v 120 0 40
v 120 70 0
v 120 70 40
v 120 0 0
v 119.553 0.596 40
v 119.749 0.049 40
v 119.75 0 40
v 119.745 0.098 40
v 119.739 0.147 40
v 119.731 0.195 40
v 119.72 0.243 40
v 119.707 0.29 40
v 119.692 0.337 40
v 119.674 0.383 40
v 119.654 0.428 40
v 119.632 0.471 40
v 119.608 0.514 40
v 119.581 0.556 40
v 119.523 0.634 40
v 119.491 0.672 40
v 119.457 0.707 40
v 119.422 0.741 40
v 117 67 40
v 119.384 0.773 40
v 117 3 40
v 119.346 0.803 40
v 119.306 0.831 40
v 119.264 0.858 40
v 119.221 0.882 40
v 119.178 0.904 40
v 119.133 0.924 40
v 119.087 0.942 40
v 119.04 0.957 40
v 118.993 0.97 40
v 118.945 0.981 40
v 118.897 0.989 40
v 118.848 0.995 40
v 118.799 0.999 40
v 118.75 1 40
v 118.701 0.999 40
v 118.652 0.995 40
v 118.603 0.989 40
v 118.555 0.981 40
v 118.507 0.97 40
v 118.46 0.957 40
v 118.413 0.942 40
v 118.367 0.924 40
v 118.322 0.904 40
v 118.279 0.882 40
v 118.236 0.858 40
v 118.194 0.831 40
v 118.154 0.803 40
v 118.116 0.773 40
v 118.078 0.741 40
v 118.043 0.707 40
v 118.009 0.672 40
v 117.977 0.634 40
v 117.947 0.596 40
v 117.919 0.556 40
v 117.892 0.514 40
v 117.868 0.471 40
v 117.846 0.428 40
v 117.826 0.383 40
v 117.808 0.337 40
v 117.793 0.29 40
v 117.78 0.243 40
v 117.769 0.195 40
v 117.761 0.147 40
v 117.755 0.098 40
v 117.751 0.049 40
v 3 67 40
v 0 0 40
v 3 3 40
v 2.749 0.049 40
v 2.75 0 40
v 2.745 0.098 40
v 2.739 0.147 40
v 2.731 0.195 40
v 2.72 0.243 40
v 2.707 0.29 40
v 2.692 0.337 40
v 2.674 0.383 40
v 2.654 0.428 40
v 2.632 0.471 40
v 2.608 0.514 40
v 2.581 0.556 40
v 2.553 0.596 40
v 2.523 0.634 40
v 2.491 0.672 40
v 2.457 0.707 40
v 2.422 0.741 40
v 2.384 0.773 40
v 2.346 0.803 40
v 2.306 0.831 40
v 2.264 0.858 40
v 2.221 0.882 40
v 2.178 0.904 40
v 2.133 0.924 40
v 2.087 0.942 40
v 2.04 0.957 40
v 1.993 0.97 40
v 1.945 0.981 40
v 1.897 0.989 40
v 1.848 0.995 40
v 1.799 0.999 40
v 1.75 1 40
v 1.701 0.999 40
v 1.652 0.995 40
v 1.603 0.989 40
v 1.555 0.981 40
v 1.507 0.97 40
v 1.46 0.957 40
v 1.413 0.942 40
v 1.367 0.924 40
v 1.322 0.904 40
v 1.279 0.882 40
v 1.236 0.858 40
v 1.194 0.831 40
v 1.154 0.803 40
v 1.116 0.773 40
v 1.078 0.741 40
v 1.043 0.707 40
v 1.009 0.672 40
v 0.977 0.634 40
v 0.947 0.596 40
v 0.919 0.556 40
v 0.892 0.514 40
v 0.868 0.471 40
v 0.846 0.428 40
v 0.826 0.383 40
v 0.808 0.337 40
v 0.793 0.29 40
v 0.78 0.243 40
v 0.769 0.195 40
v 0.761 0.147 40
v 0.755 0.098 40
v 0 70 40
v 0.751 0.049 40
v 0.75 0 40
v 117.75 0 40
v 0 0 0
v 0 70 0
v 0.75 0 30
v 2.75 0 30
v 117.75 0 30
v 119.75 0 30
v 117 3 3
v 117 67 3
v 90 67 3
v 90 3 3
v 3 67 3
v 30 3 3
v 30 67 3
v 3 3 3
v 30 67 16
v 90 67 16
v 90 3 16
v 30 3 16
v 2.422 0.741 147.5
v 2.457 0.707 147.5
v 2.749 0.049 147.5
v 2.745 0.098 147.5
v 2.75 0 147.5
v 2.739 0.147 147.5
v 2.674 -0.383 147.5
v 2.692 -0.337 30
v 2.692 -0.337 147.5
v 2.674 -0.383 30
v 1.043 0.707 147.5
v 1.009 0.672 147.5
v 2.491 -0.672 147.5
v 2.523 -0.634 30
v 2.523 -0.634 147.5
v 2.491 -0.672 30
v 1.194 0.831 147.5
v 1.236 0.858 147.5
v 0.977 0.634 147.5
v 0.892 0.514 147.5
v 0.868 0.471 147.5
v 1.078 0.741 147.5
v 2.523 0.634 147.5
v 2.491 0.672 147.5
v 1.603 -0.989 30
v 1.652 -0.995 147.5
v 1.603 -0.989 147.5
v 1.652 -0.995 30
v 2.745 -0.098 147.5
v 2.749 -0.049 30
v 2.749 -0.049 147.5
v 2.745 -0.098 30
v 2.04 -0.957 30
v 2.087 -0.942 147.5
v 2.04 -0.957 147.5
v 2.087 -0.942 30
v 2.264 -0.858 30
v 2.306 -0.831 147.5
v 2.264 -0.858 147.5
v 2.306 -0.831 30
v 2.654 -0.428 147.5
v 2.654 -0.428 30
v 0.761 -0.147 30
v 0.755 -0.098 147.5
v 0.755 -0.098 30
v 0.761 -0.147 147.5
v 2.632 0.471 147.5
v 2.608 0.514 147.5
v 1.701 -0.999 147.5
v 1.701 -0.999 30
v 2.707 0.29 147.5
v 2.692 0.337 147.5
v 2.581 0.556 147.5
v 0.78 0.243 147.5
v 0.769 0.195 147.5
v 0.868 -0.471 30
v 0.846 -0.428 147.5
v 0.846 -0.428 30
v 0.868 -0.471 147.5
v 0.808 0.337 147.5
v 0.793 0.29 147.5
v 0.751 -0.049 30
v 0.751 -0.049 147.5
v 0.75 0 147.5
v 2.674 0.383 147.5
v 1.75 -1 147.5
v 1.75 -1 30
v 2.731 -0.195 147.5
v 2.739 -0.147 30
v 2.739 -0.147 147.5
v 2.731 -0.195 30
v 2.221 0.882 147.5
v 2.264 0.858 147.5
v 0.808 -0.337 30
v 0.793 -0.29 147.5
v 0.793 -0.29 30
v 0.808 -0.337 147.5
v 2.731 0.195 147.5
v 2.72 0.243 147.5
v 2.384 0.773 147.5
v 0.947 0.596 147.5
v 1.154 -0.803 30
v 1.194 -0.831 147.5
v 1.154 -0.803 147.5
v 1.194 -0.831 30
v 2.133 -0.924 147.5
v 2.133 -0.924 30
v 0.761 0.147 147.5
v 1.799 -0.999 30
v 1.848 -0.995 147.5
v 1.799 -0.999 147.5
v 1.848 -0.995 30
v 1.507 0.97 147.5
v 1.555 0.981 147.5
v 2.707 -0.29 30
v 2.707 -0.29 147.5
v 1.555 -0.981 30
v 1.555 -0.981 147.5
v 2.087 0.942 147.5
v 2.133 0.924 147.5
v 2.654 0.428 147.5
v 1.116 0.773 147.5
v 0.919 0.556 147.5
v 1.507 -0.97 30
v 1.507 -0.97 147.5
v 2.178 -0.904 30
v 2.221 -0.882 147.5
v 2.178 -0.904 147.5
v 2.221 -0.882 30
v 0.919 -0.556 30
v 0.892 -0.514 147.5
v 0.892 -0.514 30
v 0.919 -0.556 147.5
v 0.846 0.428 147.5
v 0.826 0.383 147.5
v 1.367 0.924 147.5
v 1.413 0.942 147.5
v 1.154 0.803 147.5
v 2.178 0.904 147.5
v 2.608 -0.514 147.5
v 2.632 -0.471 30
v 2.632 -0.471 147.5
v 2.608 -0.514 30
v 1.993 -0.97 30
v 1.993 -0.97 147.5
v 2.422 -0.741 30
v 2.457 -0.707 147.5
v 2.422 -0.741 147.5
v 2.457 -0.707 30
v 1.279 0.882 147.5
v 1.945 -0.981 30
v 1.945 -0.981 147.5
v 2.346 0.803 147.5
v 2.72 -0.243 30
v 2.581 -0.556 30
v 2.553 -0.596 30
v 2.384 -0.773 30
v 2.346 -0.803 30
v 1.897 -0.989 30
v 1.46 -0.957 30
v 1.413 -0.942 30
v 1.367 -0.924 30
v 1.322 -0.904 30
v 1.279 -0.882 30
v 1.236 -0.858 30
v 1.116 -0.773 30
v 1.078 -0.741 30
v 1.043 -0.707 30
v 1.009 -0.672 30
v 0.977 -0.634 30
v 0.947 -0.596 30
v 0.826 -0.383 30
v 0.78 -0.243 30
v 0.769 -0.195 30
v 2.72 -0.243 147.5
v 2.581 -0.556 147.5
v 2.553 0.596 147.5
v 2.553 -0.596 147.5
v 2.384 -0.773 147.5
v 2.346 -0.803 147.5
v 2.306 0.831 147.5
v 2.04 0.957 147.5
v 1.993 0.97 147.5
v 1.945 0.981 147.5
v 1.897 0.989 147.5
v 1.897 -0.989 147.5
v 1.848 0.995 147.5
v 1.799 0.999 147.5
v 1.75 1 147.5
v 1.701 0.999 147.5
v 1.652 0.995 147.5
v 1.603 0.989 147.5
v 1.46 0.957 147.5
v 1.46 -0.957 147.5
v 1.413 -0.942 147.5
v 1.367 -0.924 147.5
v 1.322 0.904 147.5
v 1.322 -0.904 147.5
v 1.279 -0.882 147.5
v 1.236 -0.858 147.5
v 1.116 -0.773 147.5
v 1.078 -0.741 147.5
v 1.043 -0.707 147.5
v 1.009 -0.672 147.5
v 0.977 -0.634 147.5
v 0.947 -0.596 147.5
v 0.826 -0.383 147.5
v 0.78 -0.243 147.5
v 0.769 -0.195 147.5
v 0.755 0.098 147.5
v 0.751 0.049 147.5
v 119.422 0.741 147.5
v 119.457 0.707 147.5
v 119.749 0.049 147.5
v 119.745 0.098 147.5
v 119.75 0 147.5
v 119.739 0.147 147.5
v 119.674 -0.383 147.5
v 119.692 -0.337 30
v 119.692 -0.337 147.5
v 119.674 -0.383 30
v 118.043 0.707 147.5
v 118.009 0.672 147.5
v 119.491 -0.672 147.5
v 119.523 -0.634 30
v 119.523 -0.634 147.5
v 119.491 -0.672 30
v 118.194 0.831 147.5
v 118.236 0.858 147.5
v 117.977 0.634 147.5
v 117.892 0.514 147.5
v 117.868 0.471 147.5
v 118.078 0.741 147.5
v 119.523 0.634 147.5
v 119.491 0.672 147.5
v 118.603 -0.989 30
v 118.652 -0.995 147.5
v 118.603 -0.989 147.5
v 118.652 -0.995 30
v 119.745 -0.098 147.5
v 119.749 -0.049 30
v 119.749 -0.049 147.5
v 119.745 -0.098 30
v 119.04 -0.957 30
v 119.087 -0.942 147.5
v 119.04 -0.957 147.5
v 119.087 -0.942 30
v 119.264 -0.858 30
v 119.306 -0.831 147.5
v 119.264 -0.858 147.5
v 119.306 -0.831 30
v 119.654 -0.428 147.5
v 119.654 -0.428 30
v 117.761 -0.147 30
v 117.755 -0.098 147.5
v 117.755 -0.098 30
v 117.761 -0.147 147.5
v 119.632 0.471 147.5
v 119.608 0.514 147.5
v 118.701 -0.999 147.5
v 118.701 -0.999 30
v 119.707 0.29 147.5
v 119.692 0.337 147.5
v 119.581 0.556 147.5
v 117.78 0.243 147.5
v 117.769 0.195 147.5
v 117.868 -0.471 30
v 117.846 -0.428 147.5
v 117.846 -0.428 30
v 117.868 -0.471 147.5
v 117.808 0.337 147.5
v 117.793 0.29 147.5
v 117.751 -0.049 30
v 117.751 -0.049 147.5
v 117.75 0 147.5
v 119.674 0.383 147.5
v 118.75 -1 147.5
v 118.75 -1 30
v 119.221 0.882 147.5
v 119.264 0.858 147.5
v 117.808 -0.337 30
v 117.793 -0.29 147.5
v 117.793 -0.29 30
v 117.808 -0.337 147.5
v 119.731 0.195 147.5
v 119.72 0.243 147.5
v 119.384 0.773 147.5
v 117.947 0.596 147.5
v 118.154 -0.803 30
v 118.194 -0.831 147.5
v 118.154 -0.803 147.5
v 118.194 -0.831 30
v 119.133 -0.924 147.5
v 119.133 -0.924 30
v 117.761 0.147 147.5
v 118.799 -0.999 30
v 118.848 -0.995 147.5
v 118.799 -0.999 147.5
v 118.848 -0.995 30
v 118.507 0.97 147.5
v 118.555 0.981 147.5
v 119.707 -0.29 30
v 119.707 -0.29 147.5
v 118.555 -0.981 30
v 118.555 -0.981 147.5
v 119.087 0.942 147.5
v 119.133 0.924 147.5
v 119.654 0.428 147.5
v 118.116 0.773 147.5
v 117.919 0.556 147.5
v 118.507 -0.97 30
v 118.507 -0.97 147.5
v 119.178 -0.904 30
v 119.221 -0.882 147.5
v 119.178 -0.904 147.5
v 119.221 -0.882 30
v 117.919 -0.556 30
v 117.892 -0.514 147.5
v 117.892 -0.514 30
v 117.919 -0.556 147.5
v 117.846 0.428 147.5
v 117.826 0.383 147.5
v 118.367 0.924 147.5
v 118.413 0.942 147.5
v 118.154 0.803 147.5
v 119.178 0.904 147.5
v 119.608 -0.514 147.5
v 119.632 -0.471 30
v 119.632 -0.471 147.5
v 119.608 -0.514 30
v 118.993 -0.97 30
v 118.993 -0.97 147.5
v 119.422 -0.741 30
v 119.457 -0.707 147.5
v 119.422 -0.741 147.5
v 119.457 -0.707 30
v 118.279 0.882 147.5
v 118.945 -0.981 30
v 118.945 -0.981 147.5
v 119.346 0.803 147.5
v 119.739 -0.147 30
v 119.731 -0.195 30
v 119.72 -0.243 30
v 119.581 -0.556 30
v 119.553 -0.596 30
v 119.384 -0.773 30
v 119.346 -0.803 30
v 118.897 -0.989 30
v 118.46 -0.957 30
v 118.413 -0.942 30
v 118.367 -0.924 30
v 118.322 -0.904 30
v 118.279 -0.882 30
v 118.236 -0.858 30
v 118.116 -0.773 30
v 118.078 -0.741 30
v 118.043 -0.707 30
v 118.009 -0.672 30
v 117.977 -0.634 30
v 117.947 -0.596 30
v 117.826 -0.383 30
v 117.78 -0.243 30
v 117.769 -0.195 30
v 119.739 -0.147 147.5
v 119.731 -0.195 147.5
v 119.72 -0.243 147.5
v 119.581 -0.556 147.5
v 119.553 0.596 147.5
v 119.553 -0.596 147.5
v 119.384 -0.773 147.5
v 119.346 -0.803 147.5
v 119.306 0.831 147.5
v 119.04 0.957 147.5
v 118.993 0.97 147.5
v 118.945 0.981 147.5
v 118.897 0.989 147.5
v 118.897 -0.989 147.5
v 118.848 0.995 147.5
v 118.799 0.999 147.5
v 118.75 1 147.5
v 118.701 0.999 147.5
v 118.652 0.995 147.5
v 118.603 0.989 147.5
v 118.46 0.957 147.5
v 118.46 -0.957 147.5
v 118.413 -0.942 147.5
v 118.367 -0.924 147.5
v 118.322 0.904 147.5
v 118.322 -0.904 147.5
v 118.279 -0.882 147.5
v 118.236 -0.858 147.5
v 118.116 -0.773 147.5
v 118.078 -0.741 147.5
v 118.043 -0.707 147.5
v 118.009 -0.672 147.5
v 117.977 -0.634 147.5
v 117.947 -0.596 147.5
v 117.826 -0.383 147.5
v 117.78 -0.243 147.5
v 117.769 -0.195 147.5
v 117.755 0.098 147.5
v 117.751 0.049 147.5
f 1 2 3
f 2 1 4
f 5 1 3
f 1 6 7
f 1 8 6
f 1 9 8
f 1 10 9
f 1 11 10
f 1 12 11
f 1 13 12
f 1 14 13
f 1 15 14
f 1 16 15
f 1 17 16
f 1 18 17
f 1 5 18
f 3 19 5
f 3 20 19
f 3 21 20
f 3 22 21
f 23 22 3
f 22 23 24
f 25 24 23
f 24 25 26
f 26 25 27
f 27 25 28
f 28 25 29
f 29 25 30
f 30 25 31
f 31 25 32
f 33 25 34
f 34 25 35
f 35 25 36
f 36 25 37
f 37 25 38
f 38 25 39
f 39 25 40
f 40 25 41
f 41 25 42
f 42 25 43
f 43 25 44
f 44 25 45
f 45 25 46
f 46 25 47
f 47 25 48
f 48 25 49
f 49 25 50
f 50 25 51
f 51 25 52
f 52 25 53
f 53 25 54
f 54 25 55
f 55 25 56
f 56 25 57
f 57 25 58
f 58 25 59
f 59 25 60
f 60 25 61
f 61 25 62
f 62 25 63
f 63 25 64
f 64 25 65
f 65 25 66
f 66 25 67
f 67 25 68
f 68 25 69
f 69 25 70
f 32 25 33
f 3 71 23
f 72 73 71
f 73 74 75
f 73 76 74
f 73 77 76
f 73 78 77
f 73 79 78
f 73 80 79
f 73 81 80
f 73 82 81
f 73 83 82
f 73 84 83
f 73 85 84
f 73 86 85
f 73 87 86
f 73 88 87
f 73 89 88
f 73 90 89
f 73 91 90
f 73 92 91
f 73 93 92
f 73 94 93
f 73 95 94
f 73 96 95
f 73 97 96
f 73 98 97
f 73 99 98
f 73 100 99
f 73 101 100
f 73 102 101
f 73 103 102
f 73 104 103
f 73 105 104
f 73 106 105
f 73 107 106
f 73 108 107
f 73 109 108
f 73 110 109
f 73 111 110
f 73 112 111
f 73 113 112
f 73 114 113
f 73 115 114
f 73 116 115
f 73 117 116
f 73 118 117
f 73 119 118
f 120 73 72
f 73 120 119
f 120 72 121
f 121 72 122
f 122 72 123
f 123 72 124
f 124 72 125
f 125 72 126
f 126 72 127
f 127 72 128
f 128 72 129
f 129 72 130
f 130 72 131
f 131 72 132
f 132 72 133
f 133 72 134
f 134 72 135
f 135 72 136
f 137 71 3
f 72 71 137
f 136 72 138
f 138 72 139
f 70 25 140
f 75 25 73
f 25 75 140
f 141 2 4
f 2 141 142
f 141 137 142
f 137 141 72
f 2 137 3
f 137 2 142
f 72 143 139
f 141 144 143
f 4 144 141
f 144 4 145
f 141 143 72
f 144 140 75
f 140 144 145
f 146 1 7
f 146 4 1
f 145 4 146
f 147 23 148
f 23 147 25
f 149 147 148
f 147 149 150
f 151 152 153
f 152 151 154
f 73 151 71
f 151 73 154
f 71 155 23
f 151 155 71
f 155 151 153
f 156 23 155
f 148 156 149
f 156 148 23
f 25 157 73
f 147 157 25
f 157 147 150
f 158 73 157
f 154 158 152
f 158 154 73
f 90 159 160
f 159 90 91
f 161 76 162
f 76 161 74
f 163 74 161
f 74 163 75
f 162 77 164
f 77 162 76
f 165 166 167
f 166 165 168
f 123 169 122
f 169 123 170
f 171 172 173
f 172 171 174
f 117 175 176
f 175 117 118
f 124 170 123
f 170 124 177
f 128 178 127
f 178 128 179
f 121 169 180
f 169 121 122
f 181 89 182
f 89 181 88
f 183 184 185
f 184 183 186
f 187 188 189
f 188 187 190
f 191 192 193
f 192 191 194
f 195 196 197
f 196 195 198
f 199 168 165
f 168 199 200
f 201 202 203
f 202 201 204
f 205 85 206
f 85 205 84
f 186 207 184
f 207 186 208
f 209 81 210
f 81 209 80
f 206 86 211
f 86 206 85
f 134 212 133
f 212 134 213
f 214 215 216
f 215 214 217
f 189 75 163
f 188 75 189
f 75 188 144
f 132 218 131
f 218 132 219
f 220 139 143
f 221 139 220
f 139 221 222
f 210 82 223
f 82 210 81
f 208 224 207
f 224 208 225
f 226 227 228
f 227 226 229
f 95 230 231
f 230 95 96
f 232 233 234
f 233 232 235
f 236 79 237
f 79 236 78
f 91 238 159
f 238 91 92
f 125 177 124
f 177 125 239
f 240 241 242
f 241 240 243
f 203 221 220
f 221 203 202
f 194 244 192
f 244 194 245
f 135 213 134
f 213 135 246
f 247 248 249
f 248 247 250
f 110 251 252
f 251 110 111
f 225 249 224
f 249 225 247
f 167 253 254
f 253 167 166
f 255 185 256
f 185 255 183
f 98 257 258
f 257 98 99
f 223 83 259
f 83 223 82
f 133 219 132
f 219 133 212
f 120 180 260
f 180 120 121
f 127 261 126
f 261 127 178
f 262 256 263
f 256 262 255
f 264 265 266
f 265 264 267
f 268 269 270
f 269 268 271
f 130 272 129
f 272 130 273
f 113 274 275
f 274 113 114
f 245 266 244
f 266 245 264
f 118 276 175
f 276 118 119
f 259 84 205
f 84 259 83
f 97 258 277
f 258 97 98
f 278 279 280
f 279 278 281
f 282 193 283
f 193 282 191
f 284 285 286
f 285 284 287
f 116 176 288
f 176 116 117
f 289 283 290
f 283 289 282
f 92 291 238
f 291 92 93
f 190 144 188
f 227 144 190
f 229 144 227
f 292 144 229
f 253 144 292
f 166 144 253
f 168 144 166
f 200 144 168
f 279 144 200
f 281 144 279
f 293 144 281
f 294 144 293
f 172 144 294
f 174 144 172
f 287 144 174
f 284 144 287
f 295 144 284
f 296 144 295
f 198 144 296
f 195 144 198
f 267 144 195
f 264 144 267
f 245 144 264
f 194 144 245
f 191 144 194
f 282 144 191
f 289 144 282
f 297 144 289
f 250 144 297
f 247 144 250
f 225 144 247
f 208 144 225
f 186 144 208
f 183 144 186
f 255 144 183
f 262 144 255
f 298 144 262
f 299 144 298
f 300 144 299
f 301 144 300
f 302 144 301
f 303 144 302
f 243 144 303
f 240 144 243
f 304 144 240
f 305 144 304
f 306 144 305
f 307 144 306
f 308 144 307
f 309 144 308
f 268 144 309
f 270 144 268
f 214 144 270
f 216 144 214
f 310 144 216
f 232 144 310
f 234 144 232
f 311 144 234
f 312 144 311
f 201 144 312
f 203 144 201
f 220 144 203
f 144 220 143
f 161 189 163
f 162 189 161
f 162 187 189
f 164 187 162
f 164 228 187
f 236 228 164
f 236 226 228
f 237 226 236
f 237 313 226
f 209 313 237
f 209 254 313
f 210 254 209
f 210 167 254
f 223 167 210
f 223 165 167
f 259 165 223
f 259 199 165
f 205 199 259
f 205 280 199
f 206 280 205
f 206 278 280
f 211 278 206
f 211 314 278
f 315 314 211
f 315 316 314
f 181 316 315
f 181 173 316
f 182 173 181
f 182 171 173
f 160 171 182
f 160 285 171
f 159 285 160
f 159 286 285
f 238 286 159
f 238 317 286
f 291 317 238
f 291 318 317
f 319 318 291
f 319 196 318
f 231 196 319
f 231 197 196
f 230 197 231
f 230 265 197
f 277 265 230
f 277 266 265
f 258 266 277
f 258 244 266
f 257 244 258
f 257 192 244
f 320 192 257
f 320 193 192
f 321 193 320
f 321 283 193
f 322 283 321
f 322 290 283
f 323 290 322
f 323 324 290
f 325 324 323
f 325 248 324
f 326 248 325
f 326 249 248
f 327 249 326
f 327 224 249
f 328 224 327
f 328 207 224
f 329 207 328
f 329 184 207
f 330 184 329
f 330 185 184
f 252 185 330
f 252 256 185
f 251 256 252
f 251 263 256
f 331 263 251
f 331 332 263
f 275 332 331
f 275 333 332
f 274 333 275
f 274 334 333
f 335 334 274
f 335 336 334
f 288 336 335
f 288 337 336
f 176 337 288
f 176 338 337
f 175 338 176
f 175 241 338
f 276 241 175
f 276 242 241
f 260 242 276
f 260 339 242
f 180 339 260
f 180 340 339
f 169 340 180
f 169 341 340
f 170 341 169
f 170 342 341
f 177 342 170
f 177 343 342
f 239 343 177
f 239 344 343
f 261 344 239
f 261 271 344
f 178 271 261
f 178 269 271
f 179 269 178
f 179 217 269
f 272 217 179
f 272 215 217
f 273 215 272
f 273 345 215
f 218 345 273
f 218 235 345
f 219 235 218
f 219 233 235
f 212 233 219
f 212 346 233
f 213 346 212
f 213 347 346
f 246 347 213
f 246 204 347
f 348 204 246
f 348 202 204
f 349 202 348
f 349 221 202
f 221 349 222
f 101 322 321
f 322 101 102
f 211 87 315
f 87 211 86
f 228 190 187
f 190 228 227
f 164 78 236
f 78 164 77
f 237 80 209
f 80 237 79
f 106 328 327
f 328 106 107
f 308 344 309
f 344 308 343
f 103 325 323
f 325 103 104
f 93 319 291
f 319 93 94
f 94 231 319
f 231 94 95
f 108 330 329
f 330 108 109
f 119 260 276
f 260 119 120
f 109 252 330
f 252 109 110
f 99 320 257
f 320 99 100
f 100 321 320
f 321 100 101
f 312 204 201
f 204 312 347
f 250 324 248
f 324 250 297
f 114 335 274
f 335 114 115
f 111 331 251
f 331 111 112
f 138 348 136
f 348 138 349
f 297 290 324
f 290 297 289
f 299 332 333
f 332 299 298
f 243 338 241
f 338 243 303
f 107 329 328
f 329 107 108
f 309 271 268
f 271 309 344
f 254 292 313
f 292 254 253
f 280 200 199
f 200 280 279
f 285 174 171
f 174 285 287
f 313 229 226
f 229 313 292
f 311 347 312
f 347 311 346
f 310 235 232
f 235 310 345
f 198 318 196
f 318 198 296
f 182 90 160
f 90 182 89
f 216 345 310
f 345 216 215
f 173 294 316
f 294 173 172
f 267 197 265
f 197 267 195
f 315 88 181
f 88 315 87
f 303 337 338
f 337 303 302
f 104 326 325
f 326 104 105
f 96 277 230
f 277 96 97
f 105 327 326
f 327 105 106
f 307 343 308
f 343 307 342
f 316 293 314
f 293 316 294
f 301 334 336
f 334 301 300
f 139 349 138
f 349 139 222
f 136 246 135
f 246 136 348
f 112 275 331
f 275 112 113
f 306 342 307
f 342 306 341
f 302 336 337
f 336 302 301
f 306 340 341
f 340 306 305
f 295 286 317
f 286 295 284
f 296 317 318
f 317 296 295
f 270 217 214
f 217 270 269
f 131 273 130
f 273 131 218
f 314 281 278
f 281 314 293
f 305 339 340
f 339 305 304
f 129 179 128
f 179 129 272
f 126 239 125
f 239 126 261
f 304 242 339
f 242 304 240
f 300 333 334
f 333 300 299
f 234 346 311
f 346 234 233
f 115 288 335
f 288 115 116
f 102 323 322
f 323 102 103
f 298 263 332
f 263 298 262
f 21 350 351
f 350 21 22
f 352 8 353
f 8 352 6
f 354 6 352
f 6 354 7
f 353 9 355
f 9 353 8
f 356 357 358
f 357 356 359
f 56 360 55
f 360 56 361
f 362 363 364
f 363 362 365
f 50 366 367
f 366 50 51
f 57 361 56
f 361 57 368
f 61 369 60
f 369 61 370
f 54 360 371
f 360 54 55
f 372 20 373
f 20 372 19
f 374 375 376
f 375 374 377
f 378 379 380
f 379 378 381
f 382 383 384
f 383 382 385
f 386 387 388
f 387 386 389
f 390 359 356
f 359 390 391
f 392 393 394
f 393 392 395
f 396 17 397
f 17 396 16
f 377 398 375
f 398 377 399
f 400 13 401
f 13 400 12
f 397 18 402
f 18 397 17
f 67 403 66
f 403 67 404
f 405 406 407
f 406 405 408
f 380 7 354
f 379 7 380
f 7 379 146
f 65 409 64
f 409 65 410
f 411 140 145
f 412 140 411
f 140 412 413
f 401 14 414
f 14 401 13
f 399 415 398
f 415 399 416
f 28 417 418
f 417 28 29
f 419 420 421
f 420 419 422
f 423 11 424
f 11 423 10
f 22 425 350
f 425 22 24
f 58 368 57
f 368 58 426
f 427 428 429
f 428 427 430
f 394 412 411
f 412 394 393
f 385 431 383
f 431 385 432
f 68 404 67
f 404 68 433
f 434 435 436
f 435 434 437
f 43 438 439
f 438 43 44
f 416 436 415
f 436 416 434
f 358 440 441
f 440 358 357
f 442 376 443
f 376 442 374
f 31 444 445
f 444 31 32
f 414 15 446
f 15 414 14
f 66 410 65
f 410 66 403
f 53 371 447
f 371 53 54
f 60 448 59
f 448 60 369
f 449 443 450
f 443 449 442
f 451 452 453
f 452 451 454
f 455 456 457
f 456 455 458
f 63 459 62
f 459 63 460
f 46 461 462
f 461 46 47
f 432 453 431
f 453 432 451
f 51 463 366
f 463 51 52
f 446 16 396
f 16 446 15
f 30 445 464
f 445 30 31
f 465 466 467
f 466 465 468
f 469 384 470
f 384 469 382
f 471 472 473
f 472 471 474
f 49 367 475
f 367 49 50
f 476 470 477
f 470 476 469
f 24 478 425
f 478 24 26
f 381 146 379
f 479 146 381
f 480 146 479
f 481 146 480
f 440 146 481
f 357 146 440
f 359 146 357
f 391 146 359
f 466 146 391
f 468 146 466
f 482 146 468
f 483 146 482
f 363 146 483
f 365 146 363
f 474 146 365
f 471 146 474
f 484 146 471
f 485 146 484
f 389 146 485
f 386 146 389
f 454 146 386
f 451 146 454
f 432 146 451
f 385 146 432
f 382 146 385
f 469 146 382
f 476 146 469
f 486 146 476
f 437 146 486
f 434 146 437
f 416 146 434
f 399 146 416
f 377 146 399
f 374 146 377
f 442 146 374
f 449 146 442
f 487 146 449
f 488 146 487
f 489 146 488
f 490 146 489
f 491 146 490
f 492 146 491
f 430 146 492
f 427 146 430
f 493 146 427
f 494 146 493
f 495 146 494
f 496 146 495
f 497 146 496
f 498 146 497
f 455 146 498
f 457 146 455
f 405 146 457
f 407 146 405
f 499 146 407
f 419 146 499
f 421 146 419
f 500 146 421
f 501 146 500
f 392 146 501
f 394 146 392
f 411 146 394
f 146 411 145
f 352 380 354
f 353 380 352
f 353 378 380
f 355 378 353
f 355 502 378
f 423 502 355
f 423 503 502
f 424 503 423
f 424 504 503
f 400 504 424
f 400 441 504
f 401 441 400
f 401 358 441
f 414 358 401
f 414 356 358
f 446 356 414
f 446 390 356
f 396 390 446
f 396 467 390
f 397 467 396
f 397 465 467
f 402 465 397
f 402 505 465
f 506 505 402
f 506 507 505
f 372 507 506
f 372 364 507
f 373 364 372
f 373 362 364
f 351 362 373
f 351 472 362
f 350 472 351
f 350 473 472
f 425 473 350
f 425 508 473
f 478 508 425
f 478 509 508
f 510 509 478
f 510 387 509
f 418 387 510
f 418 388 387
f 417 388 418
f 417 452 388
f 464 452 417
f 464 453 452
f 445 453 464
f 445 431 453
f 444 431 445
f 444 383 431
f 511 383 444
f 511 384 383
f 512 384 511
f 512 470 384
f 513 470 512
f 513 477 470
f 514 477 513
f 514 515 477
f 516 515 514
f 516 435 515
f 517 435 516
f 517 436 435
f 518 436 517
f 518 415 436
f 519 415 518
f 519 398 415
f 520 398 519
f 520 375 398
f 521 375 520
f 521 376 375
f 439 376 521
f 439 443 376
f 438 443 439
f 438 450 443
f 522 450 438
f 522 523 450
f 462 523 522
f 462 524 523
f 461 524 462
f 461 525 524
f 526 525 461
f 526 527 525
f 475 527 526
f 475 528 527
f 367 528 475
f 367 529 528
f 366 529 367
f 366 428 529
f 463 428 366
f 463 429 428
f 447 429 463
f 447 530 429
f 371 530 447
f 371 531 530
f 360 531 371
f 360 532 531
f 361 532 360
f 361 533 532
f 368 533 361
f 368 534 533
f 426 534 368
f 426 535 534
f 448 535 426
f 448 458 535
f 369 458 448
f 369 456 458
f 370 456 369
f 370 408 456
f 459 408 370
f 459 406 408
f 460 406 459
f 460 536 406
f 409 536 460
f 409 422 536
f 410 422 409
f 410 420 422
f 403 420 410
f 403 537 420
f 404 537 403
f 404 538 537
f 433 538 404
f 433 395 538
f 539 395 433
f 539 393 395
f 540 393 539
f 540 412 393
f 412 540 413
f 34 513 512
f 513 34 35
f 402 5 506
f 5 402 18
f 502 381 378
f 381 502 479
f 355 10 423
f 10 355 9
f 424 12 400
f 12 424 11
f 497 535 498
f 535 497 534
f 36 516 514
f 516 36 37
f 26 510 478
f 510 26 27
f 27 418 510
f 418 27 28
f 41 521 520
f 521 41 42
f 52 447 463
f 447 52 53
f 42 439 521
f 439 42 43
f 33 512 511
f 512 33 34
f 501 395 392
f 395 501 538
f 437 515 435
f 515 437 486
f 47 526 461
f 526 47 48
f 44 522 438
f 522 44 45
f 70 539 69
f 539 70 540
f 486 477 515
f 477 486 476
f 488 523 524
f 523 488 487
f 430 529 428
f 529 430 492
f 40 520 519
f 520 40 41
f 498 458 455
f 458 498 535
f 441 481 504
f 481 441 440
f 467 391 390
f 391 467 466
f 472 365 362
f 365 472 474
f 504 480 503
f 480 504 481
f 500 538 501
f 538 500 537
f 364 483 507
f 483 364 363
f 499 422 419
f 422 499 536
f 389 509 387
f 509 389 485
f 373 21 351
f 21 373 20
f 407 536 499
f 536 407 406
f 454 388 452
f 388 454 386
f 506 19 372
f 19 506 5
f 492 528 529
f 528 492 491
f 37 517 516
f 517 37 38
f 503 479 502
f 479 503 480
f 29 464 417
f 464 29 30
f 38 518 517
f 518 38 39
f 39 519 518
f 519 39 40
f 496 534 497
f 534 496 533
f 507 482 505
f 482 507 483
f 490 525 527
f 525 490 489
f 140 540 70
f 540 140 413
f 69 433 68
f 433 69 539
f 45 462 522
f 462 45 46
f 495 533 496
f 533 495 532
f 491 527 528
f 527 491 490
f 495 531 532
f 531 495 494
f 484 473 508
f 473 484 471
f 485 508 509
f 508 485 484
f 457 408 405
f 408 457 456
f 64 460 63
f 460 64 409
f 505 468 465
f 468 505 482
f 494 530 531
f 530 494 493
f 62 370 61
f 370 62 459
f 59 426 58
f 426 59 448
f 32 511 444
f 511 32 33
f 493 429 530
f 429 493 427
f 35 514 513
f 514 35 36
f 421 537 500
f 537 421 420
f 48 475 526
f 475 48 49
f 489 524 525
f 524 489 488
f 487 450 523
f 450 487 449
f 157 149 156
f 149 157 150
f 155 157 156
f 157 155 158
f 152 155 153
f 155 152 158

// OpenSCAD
// Buffer Tank for Mini Horizontal Gel Electrophoresis
// Units: millimetres

// Outer Dimensions (Strictly enforced)
$outer_x = 120;
$outer_y = 70;
$outer_z = 40;

// Wall and Floor Thickness
$wall_thickness = 3;
$floor_thickness = 3;

// Platform Dimensions
$platform_length = 60; // X dimension
$platform_width = $outer_y - (2 * $wall_thickness); // Spans full inner width
$platform_height = 10; // Height above inner floor
$platform_top_z = $floor_thickness + $platform_height; // Absolute Z of top surface (13)

// Hole Dimensions
$hole_diameter = 2;
$hole_radius = $hole_diameter / 2;
$hole_y = 0; // Specified position
$hole_z = 30; // Absolute Z position
$hole_extension = 0.5; // Extension past face for clean cutting

// Configuration
$fn = 128; // High resolution for smooth curves

// Calculate Inner Dimensions
$inner_x = $outer_x - (2 * $wall_thickness);
$inner_y = $outer_y - (2 * $wall_thickness);
$inner_z = $outer_z - $floor_thickness;

// Main Tank Body
// Constructed as a hollow box with a floor
difference() {
    // Outer Block
    cube([
        $outer_x, 
        $outer_y, 
        $outer_z
    ]);
    
    // Inner Void (Hollow space)
    // The void starts at z = $floor_thickness
    translate([
        $wall_thickness, 
        $wall_thickness, 
        $floor_thickness
    ]) {
        cube([
            $inner_x, 
            $inner_y, 
            $inner_z
        ]);
    }
}

// Raised Platform
// Positioned in the middle of the tank, spanning full inner width
// Starts at inner wall (Y = $wall_thickness)
translate([
    ($outer_x / 2) - ($platform_length / 2), 
    $wall_thickness, // Aligned with inner wall start
    $floor_thickness
]) {
    // Platform Base (extends through the void to the floor)
    cube([
        $platform_length, 
        $platform_width, 
        $platform_height + $floor_thickness
    ]);
}

// Electrode Holes
// Drilled horizontally along X axis.
// To maintain the 120mm outer dimension, we drill starting from the inner face of the wall
// and extend outwards.
// Left Wall: Starts at X = $wall_thickness, extends to X = 0 (and slightly beyond)
// Right Wall: Starts at X = $outer_x - $wall_thickness, extends to X = $outer_x (and slightly beyond)

for (side = [0, 1]) {
    // Calculate start X for the cylinder
    // Side 0 (Left): Start at inner face ($wall_thickness)
    // Side 1 (Right): Start at inner face ($outer_x - $wall_thickness)
    $start_x = (side == 0) ? $wall_thickness : ($outer_x - $wall_thickness);
    
    // Calculate end X for the cylinder (must extend past the outer face)
    // Side 0: End at 0 - $hole_extension
    // Side 1: End at $outer_x + $hole_extension
    $end_x = (side == 0) ? ($hole_extension) : ($outer_x + $hole_extension);
    
    translate([
        ($start_x + $end_x) / 2, // Center the cylinder between start and end
        $hole_y, 
        $hole_z
    ]) {
        // Cylinder for the hole
        // Length is the distance from inner face to outer face plus extension
        $cylinder_length = ($outer_x - $wall_thickness) + $hole_extension;
        
        cylinder(
            h = $cylinder_length, 
            r = $hole_radius,
            $fn = $fn
        );
    }
}
